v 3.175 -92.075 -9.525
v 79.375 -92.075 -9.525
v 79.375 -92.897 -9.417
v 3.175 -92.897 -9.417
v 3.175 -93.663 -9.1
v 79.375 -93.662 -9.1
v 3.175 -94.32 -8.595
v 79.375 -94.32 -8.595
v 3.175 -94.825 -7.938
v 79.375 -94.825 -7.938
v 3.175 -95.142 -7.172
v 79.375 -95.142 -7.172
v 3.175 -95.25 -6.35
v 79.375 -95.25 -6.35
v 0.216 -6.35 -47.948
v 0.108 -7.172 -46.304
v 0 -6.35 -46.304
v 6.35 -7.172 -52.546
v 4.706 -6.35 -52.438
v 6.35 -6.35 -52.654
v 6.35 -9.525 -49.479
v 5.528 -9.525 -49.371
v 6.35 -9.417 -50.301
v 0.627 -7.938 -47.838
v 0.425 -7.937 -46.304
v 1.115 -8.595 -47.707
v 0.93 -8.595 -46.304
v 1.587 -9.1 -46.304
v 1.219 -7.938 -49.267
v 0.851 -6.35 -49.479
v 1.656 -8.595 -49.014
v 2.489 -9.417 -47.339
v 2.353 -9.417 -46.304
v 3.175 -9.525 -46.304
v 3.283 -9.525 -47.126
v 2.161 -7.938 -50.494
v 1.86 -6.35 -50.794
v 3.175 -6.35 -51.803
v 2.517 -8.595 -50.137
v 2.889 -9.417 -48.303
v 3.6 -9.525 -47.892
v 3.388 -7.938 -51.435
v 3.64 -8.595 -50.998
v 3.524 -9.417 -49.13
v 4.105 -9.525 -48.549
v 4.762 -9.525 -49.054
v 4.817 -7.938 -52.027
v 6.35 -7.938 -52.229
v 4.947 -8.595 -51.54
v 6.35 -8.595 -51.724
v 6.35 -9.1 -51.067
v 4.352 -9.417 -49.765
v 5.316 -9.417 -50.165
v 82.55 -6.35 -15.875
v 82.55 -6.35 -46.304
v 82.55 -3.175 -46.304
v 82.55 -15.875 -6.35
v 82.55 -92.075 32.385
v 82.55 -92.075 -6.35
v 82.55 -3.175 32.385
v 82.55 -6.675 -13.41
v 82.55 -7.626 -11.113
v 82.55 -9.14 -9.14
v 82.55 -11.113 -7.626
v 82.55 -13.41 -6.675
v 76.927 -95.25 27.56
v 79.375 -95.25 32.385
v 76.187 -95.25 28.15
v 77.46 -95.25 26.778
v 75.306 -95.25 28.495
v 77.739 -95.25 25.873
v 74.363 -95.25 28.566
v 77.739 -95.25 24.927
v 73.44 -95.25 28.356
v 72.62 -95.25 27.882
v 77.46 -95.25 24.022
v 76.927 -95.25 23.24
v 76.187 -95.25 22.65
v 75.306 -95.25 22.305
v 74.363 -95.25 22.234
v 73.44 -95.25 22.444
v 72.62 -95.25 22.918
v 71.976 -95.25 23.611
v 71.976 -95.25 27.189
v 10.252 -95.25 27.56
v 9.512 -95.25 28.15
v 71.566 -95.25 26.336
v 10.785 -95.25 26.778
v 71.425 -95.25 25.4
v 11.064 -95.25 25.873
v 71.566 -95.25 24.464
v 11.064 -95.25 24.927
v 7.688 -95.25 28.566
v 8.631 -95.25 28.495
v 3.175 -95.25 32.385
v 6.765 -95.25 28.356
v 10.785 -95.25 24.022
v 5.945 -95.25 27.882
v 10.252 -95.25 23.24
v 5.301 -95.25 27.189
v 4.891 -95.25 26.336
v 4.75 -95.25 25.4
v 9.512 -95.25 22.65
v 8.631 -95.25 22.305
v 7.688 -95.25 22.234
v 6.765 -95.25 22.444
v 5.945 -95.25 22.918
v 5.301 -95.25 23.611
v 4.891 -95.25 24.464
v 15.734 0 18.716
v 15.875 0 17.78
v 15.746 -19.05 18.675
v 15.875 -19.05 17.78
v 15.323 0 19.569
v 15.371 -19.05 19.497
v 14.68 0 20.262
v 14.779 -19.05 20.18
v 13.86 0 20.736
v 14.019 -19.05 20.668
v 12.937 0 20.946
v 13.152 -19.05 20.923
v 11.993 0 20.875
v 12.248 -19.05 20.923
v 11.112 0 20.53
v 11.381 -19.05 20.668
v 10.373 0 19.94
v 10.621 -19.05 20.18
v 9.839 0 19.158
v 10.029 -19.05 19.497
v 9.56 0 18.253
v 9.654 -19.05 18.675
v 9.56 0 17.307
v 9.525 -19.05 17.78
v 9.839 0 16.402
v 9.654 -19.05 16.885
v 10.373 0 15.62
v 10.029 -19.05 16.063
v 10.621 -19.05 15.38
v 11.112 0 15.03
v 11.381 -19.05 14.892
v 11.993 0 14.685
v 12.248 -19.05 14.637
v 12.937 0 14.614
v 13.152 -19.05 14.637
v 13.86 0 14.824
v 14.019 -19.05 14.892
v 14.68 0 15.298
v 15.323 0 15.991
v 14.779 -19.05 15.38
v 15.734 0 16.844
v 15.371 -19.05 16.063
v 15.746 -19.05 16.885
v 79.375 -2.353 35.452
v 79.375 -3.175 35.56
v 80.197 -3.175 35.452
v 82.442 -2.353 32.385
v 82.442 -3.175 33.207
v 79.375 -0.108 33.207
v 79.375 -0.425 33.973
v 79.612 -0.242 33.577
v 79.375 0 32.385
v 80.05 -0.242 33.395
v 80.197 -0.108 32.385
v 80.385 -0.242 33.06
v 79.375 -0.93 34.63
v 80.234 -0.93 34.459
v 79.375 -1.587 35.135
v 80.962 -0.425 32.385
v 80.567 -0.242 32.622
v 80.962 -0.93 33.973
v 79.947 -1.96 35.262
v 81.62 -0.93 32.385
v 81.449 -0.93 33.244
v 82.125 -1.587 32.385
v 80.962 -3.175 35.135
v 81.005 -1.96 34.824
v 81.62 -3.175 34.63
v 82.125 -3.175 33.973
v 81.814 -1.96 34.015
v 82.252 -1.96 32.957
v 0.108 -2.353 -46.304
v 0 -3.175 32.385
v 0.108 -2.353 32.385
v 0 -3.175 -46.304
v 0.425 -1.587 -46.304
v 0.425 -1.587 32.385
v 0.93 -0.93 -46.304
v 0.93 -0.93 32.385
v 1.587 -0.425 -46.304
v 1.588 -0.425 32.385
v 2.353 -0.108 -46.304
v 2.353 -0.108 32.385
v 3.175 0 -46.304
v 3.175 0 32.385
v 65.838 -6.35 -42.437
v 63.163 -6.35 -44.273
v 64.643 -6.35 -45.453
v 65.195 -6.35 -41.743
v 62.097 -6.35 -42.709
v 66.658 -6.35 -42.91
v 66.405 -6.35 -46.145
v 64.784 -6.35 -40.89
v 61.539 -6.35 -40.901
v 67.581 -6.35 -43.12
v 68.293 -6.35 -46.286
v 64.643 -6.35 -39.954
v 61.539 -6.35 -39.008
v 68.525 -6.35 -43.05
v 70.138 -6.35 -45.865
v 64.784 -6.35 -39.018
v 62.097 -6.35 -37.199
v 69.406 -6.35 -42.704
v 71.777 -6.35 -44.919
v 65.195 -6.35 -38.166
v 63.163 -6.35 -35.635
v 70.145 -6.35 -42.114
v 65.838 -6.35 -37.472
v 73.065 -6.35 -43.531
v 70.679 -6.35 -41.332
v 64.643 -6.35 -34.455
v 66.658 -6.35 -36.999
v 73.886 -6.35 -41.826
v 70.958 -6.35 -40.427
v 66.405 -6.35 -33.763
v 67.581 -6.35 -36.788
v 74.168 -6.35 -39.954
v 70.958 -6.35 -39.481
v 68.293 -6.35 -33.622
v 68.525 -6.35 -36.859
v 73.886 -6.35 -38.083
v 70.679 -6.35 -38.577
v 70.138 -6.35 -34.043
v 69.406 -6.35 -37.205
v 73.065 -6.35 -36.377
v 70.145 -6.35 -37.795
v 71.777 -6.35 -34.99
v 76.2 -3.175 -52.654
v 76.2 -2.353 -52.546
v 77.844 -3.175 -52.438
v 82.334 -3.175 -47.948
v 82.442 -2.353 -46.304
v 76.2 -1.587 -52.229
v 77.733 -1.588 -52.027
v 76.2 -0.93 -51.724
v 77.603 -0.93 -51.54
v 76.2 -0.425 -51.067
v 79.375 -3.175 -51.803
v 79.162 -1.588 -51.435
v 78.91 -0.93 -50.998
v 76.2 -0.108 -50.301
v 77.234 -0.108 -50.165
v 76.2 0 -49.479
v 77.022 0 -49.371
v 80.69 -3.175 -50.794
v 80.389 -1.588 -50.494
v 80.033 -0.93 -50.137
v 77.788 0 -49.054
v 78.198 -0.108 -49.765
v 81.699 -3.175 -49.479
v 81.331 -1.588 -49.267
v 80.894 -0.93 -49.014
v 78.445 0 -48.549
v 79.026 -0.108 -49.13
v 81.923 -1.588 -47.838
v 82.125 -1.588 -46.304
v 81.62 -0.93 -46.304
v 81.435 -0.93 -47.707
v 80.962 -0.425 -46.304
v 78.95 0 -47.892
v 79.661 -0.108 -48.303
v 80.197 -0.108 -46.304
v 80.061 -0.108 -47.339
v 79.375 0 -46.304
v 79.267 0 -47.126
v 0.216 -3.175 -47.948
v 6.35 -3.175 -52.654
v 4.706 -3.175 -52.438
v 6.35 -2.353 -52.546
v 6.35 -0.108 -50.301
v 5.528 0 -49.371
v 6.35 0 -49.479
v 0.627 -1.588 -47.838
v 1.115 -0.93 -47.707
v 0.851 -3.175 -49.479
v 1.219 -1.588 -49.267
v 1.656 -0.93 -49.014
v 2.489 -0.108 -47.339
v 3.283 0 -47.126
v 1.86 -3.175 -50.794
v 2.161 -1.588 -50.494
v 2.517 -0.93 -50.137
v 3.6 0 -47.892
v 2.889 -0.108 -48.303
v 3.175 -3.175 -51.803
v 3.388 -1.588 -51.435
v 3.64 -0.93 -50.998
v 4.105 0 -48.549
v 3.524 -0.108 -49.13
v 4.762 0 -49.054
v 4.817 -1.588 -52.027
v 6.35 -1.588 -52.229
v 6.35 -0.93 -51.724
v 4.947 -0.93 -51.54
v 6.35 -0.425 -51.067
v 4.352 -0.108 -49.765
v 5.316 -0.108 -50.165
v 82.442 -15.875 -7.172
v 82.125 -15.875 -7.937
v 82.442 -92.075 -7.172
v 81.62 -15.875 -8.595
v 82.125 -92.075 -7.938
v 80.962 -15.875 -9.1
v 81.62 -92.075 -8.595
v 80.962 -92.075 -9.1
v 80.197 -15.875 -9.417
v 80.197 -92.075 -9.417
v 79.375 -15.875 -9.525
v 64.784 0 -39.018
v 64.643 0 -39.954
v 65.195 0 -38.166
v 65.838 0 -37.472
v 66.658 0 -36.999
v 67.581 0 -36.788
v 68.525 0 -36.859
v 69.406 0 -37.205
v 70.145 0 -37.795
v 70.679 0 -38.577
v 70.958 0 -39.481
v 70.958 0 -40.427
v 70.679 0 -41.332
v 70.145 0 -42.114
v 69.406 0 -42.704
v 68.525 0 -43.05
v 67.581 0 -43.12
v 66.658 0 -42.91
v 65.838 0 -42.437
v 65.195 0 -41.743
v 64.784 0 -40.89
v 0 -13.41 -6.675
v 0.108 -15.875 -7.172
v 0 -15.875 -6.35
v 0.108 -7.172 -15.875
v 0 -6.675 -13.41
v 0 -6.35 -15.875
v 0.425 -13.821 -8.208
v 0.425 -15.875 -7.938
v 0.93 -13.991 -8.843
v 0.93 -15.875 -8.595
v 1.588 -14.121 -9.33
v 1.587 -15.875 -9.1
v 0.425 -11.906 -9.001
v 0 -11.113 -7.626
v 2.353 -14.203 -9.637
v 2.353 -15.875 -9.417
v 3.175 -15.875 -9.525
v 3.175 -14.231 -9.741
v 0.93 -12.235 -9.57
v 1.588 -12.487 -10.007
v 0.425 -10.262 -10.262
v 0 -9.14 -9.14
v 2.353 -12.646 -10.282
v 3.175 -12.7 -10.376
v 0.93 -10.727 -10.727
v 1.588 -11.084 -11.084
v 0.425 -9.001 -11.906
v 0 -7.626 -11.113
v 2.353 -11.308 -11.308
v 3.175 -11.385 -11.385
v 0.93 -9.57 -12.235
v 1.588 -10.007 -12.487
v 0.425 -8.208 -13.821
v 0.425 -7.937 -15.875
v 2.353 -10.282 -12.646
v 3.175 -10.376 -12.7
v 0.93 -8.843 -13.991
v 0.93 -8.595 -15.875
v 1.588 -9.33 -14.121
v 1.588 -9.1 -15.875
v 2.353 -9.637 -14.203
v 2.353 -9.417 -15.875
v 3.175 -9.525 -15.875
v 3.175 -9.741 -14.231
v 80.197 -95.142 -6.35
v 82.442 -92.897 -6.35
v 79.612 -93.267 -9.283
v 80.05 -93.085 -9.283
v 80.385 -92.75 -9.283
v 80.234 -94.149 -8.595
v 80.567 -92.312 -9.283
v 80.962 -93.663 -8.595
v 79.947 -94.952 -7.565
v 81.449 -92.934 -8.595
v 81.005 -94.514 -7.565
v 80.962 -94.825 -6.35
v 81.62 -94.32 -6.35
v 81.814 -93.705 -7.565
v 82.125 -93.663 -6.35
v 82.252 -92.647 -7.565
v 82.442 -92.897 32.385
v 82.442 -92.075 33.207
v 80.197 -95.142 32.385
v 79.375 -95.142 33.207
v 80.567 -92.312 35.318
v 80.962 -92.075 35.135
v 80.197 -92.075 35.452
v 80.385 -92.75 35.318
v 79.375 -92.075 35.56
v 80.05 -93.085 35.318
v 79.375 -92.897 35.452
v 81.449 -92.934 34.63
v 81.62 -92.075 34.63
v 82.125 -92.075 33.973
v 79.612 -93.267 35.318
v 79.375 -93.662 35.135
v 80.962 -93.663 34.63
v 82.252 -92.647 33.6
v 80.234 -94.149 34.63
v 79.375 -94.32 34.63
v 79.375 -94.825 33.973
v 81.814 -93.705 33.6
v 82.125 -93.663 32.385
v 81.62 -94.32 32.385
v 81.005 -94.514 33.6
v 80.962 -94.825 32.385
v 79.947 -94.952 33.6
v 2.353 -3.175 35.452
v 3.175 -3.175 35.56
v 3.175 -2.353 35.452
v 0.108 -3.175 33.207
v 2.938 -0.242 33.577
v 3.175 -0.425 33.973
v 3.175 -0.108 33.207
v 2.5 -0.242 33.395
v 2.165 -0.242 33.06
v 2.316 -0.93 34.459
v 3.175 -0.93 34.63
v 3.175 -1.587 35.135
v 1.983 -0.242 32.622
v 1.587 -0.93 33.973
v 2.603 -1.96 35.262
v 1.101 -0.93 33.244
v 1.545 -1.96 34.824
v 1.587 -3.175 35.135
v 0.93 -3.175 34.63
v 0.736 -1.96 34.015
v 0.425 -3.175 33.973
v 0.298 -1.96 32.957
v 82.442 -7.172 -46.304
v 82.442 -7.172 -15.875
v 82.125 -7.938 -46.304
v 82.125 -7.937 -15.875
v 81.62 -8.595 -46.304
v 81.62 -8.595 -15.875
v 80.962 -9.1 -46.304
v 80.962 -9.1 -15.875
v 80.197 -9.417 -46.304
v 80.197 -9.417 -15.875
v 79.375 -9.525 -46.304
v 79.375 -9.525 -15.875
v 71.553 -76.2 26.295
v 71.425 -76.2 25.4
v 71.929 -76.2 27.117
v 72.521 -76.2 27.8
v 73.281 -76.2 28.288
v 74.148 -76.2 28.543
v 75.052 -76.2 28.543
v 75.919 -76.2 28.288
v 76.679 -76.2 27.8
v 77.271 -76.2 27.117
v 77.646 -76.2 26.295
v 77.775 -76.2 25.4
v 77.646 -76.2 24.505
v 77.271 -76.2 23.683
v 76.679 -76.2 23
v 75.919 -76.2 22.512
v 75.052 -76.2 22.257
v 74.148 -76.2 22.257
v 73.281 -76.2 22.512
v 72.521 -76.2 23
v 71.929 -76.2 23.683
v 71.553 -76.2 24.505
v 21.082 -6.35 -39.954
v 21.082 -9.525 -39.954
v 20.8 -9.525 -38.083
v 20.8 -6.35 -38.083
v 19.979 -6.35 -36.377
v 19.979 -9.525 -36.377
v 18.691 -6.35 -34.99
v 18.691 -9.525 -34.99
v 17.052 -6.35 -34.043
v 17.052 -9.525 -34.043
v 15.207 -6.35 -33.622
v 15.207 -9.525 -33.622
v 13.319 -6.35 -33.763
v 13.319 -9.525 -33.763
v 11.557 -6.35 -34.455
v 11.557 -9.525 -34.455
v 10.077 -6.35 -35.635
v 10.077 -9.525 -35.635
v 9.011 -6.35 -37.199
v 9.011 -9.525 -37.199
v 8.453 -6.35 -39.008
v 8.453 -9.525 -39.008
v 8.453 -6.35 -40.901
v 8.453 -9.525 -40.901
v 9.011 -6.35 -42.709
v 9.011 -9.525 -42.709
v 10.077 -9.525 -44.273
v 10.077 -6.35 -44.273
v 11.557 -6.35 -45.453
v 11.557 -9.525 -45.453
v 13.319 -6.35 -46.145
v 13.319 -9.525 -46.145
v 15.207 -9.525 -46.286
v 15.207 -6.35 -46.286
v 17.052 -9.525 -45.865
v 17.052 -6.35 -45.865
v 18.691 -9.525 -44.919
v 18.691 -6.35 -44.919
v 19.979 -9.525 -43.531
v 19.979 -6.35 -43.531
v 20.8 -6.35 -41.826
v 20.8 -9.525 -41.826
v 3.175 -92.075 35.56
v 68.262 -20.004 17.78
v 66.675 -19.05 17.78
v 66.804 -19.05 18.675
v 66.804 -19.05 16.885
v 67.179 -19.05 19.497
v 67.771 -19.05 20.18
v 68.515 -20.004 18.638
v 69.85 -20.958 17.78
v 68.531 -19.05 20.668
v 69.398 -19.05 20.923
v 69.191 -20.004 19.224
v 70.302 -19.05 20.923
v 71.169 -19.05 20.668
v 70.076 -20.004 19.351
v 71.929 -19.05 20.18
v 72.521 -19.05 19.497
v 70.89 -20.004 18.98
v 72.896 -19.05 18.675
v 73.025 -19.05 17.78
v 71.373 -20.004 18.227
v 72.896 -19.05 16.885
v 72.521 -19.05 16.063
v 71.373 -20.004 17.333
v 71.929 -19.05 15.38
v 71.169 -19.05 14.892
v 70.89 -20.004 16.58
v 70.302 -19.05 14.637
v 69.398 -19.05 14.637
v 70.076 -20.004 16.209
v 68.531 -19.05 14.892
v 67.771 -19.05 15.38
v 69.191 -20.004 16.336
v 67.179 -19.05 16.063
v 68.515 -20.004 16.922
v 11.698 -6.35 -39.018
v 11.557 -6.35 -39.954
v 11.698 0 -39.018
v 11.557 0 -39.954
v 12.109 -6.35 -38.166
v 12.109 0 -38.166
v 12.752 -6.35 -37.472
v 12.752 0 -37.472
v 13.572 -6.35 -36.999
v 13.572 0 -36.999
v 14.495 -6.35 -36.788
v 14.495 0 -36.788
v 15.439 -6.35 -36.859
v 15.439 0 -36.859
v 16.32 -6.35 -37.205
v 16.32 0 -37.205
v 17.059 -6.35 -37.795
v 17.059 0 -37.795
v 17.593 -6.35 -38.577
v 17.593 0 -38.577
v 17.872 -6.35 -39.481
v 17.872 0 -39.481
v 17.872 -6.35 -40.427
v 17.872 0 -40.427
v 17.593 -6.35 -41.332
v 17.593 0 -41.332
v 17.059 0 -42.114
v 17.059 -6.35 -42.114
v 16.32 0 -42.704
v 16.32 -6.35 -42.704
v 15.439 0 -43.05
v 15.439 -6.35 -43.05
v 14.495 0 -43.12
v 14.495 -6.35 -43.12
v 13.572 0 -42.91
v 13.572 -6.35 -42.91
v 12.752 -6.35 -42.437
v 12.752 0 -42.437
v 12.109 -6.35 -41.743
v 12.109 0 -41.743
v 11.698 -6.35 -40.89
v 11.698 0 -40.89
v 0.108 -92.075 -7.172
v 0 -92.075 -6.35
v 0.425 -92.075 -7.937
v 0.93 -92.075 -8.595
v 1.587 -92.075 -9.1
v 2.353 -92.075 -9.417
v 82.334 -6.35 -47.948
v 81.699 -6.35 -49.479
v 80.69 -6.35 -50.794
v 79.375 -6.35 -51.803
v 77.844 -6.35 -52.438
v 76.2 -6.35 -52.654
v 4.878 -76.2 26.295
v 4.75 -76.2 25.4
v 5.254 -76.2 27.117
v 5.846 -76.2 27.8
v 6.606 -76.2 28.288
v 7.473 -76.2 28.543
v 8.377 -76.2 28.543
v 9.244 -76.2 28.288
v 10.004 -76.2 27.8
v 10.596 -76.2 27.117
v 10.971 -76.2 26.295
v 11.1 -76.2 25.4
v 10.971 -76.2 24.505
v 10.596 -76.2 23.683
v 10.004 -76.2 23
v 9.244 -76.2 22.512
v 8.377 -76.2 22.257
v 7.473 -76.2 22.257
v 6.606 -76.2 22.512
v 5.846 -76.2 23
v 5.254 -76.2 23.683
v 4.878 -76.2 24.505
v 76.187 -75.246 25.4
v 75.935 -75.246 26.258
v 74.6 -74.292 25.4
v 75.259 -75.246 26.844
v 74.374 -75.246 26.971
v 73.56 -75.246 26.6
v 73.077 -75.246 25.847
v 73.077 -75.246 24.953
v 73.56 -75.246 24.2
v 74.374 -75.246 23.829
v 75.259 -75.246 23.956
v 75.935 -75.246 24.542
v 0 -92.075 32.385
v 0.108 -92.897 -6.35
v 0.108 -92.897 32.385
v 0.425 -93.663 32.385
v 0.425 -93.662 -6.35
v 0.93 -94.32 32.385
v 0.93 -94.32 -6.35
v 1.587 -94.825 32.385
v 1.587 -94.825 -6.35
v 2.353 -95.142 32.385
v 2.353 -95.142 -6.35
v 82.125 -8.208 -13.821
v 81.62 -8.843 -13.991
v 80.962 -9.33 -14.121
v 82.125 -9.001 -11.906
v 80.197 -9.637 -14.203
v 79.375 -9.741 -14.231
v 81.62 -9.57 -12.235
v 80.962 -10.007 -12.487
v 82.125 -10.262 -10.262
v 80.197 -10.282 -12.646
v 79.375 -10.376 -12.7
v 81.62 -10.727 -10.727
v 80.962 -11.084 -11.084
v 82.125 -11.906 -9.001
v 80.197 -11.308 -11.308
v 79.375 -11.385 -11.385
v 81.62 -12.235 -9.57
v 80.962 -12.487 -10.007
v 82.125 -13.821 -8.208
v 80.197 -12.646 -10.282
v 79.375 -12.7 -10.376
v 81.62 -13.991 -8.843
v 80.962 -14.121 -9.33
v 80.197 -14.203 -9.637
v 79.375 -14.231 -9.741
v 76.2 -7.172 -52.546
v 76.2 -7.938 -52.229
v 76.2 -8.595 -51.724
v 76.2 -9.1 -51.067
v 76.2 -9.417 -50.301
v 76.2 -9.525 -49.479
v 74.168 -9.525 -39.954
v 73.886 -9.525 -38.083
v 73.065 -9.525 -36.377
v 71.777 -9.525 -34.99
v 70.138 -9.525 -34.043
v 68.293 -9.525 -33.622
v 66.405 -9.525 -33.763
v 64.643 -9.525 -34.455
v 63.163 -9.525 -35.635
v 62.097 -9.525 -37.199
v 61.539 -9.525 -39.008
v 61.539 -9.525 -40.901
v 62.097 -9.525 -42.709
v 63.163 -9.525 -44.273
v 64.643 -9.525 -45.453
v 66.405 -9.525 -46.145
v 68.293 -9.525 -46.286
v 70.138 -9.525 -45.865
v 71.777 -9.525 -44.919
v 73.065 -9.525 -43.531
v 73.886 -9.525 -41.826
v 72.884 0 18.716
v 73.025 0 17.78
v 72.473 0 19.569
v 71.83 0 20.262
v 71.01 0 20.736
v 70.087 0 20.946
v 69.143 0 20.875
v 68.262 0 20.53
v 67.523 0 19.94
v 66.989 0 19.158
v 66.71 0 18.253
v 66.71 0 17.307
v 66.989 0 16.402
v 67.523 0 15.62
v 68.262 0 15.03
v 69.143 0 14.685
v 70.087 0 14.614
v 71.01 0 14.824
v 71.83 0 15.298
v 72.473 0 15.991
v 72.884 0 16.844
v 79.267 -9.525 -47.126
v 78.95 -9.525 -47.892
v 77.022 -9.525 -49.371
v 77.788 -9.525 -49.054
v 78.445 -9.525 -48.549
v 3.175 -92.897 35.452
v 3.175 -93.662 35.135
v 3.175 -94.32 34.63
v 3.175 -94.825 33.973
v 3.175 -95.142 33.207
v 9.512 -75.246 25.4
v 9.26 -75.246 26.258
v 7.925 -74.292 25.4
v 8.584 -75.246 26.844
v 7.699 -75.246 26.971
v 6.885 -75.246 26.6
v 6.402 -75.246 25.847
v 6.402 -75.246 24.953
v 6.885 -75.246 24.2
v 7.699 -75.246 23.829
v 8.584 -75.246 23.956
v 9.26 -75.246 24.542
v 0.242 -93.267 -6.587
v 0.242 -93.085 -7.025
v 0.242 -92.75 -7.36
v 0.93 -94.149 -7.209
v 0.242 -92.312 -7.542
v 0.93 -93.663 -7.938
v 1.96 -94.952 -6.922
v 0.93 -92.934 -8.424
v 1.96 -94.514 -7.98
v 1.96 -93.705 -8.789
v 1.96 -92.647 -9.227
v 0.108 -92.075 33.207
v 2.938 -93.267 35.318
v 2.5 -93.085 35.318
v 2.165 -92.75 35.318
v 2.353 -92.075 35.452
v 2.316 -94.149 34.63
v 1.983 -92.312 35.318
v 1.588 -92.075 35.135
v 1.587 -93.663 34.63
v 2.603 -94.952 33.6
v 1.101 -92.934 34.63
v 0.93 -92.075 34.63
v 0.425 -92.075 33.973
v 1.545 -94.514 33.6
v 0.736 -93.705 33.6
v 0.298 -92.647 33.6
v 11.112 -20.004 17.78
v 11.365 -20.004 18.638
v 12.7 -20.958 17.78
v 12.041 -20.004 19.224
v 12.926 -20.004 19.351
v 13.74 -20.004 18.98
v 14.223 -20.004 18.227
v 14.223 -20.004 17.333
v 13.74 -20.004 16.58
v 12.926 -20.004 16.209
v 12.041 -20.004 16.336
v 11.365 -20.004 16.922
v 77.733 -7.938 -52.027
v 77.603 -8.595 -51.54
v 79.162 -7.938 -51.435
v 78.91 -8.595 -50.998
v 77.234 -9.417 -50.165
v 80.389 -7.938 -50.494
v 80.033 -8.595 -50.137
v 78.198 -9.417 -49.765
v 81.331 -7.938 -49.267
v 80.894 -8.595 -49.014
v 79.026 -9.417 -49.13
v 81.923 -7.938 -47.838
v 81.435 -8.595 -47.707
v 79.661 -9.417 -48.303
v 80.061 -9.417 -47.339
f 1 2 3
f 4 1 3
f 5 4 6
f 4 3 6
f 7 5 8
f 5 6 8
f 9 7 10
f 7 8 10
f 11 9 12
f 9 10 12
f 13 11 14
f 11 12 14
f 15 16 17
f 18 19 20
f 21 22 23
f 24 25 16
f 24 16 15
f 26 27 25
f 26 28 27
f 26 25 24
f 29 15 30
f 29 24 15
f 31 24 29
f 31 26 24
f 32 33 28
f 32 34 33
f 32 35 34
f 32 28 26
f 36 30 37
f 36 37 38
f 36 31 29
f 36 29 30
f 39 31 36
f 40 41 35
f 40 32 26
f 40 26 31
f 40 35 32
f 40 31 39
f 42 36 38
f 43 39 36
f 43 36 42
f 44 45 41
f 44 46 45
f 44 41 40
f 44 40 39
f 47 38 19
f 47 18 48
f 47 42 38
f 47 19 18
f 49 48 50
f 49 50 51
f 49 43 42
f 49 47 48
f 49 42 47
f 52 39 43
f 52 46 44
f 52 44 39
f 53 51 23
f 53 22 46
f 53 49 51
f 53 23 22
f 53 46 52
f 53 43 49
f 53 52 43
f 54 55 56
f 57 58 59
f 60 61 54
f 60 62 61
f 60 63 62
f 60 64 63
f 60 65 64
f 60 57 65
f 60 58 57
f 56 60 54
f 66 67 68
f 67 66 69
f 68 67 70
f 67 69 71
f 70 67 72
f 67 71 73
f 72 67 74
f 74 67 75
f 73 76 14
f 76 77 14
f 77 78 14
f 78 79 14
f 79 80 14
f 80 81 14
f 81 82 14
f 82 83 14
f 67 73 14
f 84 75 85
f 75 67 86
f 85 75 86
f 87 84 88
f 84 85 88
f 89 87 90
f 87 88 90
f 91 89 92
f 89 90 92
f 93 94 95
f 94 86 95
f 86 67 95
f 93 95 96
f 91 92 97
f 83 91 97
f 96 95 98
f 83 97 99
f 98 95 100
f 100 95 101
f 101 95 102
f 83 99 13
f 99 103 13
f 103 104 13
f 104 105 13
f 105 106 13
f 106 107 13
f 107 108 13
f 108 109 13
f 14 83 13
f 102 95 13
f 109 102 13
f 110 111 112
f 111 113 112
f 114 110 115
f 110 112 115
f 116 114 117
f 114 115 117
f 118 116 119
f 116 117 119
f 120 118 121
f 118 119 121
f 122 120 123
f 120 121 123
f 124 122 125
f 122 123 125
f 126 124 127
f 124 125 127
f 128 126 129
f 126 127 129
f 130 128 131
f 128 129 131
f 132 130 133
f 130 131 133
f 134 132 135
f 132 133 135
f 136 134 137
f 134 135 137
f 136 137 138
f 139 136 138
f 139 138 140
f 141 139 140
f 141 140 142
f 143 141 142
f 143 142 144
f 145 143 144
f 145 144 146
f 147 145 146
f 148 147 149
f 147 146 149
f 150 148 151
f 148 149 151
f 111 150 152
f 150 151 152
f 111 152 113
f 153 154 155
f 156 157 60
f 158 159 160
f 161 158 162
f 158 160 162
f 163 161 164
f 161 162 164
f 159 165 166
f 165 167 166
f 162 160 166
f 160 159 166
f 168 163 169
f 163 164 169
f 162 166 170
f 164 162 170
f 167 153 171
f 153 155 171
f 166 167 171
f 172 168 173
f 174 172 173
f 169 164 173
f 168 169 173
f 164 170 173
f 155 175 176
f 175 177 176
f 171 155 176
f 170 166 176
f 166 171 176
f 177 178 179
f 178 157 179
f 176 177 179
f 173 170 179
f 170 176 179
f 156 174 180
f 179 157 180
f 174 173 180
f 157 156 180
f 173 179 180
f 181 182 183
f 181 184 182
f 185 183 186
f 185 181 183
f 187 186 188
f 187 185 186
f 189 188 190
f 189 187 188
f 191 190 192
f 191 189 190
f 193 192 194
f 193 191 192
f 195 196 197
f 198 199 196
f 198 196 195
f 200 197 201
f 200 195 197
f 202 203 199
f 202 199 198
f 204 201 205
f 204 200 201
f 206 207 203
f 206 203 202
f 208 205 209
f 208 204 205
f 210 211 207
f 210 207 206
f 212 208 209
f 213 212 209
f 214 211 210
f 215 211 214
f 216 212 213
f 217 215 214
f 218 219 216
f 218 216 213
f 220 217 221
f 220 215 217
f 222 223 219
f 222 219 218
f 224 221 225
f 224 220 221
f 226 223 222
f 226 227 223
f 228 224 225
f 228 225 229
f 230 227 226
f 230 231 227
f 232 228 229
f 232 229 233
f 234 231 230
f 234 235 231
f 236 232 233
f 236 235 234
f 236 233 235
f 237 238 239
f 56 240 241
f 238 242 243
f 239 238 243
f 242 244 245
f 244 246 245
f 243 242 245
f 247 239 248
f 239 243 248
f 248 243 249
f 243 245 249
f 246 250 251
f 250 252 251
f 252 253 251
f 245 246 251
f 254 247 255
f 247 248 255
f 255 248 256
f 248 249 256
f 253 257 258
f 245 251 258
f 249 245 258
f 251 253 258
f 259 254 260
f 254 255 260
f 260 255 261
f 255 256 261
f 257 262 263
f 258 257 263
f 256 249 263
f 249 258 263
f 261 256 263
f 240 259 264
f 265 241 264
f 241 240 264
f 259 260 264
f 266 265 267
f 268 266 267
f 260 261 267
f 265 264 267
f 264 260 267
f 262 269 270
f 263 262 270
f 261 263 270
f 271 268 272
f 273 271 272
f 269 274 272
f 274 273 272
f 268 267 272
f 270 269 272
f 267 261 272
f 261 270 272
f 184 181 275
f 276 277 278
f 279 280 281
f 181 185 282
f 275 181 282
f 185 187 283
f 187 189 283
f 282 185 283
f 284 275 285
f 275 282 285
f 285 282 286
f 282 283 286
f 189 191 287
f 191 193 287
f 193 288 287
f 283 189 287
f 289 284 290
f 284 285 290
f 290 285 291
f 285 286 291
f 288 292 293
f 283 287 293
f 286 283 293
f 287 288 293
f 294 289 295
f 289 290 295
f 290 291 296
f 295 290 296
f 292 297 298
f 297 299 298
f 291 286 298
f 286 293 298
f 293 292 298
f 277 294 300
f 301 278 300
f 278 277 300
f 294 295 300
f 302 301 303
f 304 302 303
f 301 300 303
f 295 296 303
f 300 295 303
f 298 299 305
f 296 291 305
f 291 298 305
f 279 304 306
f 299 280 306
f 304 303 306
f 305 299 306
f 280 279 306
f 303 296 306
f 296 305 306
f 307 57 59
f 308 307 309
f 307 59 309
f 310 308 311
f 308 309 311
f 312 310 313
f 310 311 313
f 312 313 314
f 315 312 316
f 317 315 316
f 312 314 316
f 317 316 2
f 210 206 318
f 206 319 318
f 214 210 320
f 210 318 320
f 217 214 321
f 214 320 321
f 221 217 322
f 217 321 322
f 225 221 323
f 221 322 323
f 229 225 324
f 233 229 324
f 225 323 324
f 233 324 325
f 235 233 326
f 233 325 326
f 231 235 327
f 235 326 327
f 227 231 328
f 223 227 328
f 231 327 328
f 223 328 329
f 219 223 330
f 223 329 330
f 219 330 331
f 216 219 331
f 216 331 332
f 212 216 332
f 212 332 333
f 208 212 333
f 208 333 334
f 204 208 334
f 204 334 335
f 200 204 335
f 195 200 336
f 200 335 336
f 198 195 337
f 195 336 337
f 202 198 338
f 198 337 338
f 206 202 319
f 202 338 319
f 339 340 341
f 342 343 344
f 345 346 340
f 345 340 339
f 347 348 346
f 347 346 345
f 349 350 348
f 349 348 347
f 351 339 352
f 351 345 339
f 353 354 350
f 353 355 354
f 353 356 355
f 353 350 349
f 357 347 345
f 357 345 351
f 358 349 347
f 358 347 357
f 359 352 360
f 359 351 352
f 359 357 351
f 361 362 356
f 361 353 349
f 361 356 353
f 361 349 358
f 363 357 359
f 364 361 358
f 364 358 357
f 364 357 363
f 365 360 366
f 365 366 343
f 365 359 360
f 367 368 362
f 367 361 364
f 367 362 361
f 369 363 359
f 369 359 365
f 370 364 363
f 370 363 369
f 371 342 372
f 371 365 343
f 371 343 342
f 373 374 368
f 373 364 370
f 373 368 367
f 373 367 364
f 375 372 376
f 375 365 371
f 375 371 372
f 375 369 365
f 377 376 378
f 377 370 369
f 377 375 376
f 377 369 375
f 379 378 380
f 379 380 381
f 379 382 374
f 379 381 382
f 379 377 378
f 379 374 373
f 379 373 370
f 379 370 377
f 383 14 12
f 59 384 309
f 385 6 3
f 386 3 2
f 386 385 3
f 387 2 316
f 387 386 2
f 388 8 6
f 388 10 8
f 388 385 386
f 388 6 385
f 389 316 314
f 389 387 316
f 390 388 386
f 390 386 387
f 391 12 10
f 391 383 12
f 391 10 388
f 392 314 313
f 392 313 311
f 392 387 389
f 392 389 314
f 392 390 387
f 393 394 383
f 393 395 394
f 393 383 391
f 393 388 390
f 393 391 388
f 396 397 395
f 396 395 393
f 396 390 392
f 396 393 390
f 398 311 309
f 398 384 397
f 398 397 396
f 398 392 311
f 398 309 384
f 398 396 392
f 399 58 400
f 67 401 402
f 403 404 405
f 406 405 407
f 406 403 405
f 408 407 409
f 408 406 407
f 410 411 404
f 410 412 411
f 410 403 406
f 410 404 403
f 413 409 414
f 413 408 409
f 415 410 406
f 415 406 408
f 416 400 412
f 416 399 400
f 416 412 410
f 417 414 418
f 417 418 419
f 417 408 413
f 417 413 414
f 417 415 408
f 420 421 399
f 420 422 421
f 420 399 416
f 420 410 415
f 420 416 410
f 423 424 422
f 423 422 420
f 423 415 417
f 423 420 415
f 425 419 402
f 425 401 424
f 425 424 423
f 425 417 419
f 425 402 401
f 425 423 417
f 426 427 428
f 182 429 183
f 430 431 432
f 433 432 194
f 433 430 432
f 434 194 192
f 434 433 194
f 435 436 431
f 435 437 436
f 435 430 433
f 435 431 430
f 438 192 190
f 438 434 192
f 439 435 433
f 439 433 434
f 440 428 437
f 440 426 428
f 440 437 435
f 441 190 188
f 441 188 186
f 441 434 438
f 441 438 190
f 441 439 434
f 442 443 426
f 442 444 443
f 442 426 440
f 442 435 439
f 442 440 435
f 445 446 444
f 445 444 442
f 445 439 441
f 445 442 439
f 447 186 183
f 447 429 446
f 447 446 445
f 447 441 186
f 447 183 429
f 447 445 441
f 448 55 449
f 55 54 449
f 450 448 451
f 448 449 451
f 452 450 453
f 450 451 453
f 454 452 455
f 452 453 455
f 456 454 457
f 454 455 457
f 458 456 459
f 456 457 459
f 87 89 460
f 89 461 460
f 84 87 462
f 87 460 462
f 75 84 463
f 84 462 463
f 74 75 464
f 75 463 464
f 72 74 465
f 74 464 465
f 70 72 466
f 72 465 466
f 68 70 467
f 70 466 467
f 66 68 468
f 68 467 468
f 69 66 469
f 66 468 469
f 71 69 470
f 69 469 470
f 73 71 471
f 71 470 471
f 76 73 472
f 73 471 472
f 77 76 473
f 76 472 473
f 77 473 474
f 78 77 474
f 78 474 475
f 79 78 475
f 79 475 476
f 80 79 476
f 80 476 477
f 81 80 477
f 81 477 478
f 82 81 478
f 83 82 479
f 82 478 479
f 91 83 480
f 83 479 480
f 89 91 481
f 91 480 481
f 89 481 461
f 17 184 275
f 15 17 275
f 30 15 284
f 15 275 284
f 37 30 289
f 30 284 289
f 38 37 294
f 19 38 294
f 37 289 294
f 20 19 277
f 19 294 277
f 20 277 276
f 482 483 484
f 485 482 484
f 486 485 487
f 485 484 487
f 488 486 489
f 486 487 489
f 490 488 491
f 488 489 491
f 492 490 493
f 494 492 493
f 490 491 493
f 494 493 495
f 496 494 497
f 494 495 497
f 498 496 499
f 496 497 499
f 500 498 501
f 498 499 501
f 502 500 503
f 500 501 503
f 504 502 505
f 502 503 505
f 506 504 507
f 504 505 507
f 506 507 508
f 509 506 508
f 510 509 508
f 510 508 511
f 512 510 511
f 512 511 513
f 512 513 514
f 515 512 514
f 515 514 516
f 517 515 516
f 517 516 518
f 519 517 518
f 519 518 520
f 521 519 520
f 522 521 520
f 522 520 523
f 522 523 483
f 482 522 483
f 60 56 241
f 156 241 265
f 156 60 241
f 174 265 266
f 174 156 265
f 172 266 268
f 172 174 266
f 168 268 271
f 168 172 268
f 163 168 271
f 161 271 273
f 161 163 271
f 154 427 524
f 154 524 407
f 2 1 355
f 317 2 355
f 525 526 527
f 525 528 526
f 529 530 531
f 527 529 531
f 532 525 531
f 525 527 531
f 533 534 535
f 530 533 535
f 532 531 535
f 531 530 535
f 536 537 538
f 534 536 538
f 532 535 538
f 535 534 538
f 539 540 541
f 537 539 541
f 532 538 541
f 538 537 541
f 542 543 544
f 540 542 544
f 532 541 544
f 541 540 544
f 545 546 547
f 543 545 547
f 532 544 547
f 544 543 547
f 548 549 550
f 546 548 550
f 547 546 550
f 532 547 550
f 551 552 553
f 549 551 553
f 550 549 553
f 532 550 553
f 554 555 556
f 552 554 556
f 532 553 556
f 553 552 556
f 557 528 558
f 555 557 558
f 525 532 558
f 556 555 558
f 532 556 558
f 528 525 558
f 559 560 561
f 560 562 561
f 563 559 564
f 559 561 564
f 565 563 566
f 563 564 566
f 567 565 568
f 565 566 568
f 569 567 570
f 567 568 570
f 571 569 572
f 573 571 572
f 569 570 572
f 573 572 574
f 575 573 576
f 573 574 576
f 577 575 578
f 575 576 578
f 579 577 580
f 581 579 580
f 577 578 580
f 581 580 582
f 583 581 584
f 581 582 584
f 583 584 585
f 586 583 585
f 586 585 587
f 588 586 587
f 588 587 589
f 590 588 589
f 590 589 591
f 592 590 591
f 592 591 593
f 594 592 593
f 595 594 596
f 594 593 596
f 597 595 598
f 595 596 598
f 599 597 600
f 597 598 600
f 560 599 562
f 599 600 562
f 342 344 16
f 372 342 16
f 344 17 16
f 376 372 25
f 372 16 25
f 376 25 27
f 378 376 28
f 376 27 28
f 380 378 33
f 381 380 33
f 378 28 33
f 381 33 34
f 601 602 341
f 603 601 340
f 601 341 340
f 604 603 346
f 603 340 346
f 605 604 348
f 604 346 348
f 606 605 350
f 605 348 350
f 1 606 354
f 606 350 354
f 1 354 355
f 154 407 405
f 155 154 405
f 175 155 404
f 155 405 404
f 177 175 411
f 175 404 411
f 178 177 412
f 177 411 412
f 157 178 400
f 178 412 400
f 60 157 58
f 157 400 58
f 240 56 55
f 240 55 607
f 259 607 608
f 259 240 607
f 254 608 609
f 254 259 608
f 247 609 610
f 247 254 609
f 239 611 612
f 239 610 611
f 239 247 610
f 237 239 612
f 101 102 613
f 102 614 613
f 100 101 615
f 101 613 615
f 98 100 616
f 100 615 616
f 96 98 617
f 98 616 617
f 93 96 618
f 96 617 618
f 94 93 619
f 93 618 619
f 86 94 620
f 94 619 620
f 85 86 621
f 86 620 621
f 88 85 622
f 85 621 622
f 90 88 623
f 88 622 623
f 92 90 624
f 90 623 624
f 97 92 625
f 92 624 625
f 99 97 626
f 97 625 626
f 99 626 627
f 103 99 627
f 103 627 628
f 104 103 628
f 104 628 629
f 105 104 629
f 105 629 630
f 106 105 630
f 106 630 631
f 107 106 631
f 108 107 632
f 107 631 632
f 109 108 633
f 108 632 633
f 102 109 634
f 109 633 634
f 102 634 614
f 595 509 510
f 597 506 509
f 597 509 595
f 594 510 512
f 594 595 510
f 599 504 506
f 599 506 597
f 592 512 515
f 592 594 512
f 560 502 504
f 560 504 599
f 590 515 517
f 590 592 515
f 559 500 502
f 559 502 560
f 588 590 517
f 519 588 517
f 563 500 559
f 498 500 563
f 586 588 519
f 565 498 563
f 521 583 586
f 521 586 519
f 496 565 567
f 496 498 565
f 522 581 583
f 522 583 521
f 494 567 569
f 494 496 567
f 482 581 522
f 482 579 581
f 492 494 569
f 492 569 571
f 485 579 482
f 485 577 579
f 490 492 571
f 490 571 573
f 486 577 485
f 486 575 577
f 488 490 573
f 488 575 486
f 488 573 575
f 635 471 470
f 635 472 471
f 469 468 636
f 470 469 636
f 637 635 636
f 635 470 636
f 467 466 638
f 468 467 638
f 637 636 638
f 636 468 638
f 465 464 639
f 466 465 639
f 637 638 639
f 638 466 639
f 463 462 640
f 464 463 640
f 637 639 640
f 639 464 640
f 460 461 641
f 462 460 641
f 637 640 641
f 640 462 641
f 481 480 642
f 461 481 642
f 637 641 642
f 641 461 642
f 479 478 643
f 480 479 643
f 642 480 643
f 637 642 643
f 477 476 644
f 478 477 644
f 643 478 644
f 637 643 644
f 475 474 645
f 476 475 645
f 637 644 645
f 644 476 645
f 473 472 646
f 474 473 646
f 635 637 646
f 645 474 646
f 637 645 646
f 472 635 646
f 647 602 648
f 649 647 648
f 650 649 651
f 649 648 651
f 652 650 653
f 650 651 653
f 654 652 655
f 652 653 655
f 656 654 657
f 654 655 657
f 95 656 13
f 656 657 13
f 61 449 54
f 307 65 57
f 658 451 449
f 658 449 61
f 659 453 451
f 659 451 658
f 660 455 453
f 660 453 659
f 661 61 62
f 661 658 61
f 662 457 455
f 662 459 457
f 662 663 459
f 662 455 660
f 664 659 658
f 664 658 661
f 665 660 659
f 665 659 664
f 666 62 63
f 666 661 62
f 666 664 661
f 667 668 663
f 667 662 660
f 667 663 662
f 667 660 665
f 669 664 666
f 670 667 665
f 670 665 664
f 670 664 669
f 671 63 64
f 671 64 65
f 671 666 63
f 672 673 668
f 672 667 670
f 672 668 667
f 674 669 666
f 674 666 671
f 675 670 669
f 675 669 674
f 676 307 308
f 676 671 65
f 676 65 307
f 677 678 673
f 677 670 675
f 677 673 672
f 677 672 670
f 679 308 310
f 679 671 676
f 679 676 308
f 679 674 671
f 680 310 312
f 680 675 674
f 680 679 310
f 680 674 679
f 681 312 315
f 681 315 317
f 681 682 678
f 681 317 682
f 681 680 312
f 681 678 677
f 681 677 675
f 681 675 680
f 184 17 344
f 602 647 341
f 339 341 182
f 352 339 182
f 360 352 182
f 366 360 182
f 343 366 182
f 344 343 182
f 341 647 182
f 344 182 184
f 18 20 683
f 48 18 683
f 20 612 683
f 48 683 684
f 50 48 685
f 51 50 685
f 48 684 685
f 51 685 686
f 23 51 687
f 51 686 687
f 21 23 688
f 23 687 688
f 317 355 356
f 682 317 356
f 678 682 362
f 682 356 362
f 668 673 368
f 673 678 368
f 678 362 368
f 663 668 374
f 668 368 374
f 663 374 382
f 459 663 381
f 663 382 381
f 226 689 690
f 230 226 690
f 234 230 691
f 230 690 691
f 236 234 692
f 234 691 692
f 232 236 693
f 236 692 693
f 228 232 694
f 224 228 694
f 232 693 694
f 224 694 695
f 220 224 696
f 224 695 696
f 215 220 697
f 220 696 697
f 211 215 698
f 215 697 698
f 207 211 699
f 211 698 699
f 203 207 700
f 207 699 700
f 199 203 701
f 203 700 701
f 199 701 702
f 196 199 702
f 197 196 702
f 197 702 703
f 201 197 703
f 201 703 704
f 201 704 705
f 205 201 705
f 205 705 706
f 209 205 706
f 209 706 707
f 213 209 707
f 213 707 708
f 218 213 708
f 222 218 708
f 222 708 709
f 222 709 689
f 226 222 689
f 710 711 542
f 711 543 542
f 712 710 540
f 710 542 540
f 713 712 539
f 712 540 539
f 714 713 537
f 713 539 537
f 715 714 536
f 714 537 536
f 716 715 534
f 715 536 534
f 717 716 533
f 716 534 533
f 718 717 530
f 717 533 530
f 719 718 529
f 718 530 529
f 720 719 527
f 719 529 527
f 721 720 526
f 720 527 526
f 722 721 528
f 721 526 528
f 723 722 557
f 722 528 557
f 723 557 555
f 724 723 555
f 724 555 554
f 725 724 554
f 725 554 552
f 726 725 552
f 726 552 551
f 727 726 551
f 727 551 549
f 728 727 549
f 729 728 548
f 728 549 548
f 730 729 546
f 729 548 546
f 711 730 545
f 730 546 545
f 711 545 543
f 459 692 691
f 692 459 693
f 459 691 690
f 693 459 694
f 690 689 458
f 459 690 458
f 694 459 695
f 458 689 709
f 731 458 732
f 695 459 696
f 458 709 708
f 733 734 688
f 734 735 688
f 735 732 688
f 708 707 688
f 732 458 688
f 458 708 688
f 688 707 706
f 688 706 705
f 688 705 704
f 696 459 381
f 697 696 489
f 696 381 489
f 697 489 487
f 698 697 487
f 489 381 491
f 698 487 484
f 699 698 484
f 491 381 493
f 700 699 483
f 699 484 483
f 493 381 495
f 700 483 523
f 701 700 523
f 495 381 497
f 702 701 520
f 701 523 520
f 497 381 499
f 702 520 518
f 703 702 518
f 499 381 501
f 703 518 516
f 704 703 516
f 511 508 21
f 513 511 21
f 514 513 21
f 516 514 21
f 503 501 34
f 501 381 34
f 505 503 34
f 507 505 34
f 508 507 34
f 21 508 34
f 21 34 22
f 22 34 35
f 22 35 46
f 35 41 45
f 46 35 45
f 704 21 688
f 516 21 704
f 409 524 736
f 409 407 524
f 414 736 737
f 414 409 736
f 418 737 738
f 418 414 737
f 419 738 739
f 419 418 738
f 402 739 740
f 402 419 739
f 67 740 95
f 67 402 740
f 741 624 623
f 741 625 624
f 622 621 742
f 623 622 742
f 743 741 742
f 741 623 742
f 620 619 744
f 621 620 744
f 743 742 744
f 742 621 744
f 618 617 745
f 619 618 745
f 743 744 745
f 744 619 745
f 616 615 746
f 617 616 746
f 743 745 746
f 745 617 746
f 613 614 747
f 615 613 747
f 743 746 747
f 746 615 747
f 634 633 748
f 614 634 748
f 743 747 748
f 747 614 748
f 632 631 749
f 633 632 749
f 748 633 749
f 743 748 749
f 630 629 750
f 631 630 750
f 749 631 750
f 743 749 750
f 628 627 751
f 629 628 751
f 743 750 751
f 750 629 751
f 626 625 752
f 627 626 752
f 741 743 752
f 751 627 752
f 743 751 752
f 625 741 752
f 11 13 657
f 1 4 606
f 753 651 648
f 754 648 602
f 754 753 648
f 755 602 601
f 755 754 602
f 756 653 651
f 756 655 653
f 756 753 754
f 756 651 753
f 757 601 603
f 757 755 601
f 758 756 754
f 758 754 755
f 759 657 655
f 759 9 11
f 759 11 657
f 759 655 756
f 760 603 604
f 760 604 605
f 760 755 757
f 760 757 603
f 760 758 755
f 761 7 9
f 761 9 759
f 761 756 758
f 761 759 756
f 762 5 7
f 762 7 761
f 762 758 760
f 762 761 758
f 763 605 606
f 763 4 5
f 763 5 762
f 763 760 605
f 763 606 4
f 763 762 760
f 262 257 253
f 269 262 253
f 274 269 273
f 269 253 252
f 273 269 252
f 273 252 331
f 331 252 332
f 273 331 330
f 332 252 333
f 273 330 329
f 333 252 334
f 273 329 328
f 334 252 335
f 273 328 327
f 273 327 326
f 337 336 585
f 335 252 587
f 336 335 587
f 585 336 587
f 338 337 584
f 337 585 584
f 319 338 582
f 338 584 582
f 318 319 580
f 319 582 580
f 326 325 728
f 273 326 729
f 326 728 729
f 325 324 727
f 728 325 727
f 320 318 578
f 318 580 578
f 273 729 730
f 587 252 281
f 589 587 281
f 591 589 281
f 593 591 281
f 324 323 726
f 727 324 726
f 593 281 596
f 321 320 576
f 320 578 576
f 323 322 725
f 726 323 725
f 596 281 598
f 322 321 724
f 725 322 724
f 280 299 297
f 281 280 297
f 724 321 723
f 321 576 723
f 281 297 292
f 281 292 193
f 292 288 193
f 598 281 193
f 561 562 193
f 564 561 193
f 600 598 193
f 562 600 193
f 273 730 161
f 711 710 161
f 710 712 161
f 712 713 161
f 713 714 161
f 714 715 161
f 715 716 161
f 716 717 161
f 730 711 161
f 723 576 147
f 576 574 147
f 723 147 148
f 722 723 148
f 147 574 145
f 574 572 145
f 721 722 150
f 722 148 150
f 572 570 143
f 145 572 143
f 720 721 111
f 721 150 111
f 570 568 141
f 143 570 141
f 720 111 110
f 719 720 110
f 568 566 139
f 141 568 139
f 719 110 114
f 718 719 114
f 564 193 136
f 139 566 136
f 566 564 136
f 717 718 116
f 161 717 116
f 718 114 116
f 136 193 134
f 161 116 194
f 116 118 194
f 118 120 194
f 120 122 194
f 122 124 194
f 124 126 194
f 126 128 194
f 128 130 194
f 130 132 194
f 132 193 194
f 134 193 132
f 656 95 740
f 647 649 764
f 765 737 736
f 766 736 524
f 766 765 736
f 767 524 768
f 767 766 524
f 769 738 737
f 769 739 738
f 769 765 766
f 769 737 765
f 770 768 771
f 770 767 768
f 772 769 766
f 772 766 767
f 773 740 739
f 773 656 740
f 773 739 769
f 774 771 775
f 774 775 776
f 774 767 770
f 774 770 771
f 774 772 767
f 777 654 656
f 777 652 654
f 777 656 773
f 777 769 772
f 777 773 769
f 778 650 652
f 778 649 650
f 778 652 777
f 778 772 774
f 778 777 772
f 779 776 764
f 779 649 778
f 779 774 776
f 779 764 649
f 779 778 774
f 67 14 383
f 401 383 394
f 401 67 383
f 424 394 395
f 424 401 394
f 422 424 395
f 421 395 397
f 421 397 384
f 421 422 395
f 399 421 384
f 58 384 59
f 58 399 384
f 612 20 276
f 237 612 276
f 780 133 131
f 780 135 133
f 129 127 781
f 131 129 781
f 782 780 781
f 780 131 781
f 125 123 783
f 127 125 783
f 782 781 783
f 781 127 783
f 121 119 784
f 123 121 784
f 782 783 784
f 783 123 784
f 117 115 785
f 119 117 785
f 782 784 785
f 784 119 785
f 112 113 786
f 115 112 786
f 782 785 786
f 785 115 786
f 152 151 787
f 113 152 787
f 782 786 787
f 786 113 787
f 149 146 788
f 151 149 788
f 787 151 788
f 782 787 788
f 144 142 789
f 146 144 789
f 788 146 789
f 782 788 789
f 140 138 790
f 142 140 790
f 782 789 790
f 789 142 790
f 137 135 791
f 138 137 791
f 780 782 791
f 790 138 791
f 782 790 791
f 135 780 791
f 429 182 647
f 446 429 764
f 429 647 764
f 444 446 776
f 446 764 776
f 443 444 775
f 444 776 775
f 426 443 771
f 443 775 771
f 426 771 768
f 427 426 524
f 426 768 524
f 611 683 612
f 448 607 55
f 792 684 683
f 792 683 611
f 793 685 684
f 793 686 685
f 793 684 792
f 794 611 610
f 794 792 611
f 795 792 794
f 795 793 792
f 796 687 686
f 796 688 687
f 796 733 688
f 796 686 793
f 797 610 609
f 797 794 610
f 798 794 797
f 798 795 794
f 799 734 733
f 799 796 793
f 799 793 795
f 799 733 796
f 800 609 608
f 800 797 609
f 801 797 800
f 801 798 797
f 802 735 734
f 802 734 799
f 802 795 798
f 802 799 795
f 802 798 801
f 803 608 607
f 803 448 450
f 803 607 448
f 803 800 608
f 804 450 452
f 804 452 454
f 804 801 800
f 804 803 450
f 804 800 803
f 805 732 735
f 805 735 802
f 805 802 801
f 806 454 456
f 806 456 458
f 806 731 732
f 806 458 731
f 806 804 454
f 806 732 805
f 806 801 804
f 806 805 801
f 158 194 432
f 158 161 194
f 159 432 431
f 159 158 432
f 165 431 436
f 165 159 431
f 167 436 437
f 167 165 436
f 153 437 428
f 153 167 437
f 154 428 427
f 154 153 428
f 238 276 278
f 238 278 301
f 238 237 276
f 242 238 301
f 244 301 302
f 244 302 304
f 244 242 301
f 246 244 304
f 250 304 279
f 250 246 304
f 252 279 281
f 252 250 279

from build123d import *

# Parameters (mm, degrees)
F0_W           = 82.55
F0_H           = 35.56
F1_DEPTH       = 95.25
F3_D           = 6.35
F3_DEPTH       = 19.05
F3_TIP         = 1.9077324654
F5_D           = 6.35
F5_DEPTH       = 19.05
F5_TIP         = 1.9077324654
F7_DEPTH       = 82.55
F9_D           = 6.35
F9_CBORE_D     = 12.7
F9_CBORE_DEPTH = 3.175
F10_R          = 6.35
F11_R          = 3.175


with BuildPart() as f1:
    # F0 (on Front) → F1 (new body)
    with BuildSketch(Plane.XZ):
        with Locations((41.275, 17.78)):
            Rectangle(F0_W, F0_H)
    extrude(amount=F1_DEPTH)

    # F3
    with Locations(Plane.XZ.offset(95.25)):
        with Locations((7.9248, 25.4), (74.5998, 25.4)):
            Hole(F3_D / 2, depth=F3_DEPTH)
            with Locations((0, 0, -(F3_DEPTH + F3_TIP / 2))):  # 118° drill point
                Cone(0, F3_D / 2, F3_TIP, mode=Mode.SUBTRACT)

    # F5
    with Locations(Plane(origin=(0, 0, 0), x_dir=(-1, 0, 0), z_dir=(0, 1, 0))):
        with Locations((-12.7, 17.78), (-69.85, 17.78)):
            Hole(F5_D / 2, depth=F5_DEPTH)
            with Locations((0, 0, -(F5_DEPTH + F5_TIP / 2))):  # 118° drill point
                Cone(0, F5_D / 2, F5_TIP, mode=Mode.SUBTRACT)

    # F6 (on Right) → F7 (join)
    with BuildSketch(Plane.YZ):
        with BuildLine():
            Line((0, -9.525), (0, 0))
            Line((0, 0), (-9.525, 0))
            Line((-9.525, 0), (-95.25, 0))
            Line((-95.25, 0), (-95.25, -9.525))
            Line((-95.25, -9.525), (-15.875, -9.525))
            ThreePointArc((-15.875, -9.525), (-11.3848719395, -11.3848719395), (-9.525, -15.875))
            Line((-9.525, -15.875), (-9.525, -52.6542))
            Line((-9.525, -52.6542), (0, -52.6542))
            Line((0, -52.6542), (0, -9.525))
        make_face()
    extrude(amount=F7_DEPTH)

    # F9 (through all)
    with Locations(Plane.XZ.offset(9.525)):
        with Locations((14.732, -39.9542), (67.818, -39.9542)):
            CounterBoreHole(F9_D / 2, F9_CBORE_D / 2, F9_CBORE_DEPTH)

    # F10
    f10_edges = [f1.edges().sort_by_distance(p)[0] for p in [
        (0, -4.7625, -52.6542),
        (82.55, -4.7625, -52.6542),
    ]]
    fillet(f10_edges, radius=F10_R)

    # F11
    f11_edges = [f1.edges().sort_by_distance(p)[0] for p in [
        (82.55, -95.25, 13.0175),
        (41.275, -95.25, -9.525),
        (0, -95.25, 13.0175),
        (0, -55.5625, -9.525),
        (82.55, -47.625, 35.56),
        (41.275, -95.25, 35.56),
        (0, -47.625, 35.56),
        (41.275, 0, 35.56),
        (0, 0, -5.3721),
    ]]
    fillet(f11_edges, radius=F11_R)


solid = f1.part
